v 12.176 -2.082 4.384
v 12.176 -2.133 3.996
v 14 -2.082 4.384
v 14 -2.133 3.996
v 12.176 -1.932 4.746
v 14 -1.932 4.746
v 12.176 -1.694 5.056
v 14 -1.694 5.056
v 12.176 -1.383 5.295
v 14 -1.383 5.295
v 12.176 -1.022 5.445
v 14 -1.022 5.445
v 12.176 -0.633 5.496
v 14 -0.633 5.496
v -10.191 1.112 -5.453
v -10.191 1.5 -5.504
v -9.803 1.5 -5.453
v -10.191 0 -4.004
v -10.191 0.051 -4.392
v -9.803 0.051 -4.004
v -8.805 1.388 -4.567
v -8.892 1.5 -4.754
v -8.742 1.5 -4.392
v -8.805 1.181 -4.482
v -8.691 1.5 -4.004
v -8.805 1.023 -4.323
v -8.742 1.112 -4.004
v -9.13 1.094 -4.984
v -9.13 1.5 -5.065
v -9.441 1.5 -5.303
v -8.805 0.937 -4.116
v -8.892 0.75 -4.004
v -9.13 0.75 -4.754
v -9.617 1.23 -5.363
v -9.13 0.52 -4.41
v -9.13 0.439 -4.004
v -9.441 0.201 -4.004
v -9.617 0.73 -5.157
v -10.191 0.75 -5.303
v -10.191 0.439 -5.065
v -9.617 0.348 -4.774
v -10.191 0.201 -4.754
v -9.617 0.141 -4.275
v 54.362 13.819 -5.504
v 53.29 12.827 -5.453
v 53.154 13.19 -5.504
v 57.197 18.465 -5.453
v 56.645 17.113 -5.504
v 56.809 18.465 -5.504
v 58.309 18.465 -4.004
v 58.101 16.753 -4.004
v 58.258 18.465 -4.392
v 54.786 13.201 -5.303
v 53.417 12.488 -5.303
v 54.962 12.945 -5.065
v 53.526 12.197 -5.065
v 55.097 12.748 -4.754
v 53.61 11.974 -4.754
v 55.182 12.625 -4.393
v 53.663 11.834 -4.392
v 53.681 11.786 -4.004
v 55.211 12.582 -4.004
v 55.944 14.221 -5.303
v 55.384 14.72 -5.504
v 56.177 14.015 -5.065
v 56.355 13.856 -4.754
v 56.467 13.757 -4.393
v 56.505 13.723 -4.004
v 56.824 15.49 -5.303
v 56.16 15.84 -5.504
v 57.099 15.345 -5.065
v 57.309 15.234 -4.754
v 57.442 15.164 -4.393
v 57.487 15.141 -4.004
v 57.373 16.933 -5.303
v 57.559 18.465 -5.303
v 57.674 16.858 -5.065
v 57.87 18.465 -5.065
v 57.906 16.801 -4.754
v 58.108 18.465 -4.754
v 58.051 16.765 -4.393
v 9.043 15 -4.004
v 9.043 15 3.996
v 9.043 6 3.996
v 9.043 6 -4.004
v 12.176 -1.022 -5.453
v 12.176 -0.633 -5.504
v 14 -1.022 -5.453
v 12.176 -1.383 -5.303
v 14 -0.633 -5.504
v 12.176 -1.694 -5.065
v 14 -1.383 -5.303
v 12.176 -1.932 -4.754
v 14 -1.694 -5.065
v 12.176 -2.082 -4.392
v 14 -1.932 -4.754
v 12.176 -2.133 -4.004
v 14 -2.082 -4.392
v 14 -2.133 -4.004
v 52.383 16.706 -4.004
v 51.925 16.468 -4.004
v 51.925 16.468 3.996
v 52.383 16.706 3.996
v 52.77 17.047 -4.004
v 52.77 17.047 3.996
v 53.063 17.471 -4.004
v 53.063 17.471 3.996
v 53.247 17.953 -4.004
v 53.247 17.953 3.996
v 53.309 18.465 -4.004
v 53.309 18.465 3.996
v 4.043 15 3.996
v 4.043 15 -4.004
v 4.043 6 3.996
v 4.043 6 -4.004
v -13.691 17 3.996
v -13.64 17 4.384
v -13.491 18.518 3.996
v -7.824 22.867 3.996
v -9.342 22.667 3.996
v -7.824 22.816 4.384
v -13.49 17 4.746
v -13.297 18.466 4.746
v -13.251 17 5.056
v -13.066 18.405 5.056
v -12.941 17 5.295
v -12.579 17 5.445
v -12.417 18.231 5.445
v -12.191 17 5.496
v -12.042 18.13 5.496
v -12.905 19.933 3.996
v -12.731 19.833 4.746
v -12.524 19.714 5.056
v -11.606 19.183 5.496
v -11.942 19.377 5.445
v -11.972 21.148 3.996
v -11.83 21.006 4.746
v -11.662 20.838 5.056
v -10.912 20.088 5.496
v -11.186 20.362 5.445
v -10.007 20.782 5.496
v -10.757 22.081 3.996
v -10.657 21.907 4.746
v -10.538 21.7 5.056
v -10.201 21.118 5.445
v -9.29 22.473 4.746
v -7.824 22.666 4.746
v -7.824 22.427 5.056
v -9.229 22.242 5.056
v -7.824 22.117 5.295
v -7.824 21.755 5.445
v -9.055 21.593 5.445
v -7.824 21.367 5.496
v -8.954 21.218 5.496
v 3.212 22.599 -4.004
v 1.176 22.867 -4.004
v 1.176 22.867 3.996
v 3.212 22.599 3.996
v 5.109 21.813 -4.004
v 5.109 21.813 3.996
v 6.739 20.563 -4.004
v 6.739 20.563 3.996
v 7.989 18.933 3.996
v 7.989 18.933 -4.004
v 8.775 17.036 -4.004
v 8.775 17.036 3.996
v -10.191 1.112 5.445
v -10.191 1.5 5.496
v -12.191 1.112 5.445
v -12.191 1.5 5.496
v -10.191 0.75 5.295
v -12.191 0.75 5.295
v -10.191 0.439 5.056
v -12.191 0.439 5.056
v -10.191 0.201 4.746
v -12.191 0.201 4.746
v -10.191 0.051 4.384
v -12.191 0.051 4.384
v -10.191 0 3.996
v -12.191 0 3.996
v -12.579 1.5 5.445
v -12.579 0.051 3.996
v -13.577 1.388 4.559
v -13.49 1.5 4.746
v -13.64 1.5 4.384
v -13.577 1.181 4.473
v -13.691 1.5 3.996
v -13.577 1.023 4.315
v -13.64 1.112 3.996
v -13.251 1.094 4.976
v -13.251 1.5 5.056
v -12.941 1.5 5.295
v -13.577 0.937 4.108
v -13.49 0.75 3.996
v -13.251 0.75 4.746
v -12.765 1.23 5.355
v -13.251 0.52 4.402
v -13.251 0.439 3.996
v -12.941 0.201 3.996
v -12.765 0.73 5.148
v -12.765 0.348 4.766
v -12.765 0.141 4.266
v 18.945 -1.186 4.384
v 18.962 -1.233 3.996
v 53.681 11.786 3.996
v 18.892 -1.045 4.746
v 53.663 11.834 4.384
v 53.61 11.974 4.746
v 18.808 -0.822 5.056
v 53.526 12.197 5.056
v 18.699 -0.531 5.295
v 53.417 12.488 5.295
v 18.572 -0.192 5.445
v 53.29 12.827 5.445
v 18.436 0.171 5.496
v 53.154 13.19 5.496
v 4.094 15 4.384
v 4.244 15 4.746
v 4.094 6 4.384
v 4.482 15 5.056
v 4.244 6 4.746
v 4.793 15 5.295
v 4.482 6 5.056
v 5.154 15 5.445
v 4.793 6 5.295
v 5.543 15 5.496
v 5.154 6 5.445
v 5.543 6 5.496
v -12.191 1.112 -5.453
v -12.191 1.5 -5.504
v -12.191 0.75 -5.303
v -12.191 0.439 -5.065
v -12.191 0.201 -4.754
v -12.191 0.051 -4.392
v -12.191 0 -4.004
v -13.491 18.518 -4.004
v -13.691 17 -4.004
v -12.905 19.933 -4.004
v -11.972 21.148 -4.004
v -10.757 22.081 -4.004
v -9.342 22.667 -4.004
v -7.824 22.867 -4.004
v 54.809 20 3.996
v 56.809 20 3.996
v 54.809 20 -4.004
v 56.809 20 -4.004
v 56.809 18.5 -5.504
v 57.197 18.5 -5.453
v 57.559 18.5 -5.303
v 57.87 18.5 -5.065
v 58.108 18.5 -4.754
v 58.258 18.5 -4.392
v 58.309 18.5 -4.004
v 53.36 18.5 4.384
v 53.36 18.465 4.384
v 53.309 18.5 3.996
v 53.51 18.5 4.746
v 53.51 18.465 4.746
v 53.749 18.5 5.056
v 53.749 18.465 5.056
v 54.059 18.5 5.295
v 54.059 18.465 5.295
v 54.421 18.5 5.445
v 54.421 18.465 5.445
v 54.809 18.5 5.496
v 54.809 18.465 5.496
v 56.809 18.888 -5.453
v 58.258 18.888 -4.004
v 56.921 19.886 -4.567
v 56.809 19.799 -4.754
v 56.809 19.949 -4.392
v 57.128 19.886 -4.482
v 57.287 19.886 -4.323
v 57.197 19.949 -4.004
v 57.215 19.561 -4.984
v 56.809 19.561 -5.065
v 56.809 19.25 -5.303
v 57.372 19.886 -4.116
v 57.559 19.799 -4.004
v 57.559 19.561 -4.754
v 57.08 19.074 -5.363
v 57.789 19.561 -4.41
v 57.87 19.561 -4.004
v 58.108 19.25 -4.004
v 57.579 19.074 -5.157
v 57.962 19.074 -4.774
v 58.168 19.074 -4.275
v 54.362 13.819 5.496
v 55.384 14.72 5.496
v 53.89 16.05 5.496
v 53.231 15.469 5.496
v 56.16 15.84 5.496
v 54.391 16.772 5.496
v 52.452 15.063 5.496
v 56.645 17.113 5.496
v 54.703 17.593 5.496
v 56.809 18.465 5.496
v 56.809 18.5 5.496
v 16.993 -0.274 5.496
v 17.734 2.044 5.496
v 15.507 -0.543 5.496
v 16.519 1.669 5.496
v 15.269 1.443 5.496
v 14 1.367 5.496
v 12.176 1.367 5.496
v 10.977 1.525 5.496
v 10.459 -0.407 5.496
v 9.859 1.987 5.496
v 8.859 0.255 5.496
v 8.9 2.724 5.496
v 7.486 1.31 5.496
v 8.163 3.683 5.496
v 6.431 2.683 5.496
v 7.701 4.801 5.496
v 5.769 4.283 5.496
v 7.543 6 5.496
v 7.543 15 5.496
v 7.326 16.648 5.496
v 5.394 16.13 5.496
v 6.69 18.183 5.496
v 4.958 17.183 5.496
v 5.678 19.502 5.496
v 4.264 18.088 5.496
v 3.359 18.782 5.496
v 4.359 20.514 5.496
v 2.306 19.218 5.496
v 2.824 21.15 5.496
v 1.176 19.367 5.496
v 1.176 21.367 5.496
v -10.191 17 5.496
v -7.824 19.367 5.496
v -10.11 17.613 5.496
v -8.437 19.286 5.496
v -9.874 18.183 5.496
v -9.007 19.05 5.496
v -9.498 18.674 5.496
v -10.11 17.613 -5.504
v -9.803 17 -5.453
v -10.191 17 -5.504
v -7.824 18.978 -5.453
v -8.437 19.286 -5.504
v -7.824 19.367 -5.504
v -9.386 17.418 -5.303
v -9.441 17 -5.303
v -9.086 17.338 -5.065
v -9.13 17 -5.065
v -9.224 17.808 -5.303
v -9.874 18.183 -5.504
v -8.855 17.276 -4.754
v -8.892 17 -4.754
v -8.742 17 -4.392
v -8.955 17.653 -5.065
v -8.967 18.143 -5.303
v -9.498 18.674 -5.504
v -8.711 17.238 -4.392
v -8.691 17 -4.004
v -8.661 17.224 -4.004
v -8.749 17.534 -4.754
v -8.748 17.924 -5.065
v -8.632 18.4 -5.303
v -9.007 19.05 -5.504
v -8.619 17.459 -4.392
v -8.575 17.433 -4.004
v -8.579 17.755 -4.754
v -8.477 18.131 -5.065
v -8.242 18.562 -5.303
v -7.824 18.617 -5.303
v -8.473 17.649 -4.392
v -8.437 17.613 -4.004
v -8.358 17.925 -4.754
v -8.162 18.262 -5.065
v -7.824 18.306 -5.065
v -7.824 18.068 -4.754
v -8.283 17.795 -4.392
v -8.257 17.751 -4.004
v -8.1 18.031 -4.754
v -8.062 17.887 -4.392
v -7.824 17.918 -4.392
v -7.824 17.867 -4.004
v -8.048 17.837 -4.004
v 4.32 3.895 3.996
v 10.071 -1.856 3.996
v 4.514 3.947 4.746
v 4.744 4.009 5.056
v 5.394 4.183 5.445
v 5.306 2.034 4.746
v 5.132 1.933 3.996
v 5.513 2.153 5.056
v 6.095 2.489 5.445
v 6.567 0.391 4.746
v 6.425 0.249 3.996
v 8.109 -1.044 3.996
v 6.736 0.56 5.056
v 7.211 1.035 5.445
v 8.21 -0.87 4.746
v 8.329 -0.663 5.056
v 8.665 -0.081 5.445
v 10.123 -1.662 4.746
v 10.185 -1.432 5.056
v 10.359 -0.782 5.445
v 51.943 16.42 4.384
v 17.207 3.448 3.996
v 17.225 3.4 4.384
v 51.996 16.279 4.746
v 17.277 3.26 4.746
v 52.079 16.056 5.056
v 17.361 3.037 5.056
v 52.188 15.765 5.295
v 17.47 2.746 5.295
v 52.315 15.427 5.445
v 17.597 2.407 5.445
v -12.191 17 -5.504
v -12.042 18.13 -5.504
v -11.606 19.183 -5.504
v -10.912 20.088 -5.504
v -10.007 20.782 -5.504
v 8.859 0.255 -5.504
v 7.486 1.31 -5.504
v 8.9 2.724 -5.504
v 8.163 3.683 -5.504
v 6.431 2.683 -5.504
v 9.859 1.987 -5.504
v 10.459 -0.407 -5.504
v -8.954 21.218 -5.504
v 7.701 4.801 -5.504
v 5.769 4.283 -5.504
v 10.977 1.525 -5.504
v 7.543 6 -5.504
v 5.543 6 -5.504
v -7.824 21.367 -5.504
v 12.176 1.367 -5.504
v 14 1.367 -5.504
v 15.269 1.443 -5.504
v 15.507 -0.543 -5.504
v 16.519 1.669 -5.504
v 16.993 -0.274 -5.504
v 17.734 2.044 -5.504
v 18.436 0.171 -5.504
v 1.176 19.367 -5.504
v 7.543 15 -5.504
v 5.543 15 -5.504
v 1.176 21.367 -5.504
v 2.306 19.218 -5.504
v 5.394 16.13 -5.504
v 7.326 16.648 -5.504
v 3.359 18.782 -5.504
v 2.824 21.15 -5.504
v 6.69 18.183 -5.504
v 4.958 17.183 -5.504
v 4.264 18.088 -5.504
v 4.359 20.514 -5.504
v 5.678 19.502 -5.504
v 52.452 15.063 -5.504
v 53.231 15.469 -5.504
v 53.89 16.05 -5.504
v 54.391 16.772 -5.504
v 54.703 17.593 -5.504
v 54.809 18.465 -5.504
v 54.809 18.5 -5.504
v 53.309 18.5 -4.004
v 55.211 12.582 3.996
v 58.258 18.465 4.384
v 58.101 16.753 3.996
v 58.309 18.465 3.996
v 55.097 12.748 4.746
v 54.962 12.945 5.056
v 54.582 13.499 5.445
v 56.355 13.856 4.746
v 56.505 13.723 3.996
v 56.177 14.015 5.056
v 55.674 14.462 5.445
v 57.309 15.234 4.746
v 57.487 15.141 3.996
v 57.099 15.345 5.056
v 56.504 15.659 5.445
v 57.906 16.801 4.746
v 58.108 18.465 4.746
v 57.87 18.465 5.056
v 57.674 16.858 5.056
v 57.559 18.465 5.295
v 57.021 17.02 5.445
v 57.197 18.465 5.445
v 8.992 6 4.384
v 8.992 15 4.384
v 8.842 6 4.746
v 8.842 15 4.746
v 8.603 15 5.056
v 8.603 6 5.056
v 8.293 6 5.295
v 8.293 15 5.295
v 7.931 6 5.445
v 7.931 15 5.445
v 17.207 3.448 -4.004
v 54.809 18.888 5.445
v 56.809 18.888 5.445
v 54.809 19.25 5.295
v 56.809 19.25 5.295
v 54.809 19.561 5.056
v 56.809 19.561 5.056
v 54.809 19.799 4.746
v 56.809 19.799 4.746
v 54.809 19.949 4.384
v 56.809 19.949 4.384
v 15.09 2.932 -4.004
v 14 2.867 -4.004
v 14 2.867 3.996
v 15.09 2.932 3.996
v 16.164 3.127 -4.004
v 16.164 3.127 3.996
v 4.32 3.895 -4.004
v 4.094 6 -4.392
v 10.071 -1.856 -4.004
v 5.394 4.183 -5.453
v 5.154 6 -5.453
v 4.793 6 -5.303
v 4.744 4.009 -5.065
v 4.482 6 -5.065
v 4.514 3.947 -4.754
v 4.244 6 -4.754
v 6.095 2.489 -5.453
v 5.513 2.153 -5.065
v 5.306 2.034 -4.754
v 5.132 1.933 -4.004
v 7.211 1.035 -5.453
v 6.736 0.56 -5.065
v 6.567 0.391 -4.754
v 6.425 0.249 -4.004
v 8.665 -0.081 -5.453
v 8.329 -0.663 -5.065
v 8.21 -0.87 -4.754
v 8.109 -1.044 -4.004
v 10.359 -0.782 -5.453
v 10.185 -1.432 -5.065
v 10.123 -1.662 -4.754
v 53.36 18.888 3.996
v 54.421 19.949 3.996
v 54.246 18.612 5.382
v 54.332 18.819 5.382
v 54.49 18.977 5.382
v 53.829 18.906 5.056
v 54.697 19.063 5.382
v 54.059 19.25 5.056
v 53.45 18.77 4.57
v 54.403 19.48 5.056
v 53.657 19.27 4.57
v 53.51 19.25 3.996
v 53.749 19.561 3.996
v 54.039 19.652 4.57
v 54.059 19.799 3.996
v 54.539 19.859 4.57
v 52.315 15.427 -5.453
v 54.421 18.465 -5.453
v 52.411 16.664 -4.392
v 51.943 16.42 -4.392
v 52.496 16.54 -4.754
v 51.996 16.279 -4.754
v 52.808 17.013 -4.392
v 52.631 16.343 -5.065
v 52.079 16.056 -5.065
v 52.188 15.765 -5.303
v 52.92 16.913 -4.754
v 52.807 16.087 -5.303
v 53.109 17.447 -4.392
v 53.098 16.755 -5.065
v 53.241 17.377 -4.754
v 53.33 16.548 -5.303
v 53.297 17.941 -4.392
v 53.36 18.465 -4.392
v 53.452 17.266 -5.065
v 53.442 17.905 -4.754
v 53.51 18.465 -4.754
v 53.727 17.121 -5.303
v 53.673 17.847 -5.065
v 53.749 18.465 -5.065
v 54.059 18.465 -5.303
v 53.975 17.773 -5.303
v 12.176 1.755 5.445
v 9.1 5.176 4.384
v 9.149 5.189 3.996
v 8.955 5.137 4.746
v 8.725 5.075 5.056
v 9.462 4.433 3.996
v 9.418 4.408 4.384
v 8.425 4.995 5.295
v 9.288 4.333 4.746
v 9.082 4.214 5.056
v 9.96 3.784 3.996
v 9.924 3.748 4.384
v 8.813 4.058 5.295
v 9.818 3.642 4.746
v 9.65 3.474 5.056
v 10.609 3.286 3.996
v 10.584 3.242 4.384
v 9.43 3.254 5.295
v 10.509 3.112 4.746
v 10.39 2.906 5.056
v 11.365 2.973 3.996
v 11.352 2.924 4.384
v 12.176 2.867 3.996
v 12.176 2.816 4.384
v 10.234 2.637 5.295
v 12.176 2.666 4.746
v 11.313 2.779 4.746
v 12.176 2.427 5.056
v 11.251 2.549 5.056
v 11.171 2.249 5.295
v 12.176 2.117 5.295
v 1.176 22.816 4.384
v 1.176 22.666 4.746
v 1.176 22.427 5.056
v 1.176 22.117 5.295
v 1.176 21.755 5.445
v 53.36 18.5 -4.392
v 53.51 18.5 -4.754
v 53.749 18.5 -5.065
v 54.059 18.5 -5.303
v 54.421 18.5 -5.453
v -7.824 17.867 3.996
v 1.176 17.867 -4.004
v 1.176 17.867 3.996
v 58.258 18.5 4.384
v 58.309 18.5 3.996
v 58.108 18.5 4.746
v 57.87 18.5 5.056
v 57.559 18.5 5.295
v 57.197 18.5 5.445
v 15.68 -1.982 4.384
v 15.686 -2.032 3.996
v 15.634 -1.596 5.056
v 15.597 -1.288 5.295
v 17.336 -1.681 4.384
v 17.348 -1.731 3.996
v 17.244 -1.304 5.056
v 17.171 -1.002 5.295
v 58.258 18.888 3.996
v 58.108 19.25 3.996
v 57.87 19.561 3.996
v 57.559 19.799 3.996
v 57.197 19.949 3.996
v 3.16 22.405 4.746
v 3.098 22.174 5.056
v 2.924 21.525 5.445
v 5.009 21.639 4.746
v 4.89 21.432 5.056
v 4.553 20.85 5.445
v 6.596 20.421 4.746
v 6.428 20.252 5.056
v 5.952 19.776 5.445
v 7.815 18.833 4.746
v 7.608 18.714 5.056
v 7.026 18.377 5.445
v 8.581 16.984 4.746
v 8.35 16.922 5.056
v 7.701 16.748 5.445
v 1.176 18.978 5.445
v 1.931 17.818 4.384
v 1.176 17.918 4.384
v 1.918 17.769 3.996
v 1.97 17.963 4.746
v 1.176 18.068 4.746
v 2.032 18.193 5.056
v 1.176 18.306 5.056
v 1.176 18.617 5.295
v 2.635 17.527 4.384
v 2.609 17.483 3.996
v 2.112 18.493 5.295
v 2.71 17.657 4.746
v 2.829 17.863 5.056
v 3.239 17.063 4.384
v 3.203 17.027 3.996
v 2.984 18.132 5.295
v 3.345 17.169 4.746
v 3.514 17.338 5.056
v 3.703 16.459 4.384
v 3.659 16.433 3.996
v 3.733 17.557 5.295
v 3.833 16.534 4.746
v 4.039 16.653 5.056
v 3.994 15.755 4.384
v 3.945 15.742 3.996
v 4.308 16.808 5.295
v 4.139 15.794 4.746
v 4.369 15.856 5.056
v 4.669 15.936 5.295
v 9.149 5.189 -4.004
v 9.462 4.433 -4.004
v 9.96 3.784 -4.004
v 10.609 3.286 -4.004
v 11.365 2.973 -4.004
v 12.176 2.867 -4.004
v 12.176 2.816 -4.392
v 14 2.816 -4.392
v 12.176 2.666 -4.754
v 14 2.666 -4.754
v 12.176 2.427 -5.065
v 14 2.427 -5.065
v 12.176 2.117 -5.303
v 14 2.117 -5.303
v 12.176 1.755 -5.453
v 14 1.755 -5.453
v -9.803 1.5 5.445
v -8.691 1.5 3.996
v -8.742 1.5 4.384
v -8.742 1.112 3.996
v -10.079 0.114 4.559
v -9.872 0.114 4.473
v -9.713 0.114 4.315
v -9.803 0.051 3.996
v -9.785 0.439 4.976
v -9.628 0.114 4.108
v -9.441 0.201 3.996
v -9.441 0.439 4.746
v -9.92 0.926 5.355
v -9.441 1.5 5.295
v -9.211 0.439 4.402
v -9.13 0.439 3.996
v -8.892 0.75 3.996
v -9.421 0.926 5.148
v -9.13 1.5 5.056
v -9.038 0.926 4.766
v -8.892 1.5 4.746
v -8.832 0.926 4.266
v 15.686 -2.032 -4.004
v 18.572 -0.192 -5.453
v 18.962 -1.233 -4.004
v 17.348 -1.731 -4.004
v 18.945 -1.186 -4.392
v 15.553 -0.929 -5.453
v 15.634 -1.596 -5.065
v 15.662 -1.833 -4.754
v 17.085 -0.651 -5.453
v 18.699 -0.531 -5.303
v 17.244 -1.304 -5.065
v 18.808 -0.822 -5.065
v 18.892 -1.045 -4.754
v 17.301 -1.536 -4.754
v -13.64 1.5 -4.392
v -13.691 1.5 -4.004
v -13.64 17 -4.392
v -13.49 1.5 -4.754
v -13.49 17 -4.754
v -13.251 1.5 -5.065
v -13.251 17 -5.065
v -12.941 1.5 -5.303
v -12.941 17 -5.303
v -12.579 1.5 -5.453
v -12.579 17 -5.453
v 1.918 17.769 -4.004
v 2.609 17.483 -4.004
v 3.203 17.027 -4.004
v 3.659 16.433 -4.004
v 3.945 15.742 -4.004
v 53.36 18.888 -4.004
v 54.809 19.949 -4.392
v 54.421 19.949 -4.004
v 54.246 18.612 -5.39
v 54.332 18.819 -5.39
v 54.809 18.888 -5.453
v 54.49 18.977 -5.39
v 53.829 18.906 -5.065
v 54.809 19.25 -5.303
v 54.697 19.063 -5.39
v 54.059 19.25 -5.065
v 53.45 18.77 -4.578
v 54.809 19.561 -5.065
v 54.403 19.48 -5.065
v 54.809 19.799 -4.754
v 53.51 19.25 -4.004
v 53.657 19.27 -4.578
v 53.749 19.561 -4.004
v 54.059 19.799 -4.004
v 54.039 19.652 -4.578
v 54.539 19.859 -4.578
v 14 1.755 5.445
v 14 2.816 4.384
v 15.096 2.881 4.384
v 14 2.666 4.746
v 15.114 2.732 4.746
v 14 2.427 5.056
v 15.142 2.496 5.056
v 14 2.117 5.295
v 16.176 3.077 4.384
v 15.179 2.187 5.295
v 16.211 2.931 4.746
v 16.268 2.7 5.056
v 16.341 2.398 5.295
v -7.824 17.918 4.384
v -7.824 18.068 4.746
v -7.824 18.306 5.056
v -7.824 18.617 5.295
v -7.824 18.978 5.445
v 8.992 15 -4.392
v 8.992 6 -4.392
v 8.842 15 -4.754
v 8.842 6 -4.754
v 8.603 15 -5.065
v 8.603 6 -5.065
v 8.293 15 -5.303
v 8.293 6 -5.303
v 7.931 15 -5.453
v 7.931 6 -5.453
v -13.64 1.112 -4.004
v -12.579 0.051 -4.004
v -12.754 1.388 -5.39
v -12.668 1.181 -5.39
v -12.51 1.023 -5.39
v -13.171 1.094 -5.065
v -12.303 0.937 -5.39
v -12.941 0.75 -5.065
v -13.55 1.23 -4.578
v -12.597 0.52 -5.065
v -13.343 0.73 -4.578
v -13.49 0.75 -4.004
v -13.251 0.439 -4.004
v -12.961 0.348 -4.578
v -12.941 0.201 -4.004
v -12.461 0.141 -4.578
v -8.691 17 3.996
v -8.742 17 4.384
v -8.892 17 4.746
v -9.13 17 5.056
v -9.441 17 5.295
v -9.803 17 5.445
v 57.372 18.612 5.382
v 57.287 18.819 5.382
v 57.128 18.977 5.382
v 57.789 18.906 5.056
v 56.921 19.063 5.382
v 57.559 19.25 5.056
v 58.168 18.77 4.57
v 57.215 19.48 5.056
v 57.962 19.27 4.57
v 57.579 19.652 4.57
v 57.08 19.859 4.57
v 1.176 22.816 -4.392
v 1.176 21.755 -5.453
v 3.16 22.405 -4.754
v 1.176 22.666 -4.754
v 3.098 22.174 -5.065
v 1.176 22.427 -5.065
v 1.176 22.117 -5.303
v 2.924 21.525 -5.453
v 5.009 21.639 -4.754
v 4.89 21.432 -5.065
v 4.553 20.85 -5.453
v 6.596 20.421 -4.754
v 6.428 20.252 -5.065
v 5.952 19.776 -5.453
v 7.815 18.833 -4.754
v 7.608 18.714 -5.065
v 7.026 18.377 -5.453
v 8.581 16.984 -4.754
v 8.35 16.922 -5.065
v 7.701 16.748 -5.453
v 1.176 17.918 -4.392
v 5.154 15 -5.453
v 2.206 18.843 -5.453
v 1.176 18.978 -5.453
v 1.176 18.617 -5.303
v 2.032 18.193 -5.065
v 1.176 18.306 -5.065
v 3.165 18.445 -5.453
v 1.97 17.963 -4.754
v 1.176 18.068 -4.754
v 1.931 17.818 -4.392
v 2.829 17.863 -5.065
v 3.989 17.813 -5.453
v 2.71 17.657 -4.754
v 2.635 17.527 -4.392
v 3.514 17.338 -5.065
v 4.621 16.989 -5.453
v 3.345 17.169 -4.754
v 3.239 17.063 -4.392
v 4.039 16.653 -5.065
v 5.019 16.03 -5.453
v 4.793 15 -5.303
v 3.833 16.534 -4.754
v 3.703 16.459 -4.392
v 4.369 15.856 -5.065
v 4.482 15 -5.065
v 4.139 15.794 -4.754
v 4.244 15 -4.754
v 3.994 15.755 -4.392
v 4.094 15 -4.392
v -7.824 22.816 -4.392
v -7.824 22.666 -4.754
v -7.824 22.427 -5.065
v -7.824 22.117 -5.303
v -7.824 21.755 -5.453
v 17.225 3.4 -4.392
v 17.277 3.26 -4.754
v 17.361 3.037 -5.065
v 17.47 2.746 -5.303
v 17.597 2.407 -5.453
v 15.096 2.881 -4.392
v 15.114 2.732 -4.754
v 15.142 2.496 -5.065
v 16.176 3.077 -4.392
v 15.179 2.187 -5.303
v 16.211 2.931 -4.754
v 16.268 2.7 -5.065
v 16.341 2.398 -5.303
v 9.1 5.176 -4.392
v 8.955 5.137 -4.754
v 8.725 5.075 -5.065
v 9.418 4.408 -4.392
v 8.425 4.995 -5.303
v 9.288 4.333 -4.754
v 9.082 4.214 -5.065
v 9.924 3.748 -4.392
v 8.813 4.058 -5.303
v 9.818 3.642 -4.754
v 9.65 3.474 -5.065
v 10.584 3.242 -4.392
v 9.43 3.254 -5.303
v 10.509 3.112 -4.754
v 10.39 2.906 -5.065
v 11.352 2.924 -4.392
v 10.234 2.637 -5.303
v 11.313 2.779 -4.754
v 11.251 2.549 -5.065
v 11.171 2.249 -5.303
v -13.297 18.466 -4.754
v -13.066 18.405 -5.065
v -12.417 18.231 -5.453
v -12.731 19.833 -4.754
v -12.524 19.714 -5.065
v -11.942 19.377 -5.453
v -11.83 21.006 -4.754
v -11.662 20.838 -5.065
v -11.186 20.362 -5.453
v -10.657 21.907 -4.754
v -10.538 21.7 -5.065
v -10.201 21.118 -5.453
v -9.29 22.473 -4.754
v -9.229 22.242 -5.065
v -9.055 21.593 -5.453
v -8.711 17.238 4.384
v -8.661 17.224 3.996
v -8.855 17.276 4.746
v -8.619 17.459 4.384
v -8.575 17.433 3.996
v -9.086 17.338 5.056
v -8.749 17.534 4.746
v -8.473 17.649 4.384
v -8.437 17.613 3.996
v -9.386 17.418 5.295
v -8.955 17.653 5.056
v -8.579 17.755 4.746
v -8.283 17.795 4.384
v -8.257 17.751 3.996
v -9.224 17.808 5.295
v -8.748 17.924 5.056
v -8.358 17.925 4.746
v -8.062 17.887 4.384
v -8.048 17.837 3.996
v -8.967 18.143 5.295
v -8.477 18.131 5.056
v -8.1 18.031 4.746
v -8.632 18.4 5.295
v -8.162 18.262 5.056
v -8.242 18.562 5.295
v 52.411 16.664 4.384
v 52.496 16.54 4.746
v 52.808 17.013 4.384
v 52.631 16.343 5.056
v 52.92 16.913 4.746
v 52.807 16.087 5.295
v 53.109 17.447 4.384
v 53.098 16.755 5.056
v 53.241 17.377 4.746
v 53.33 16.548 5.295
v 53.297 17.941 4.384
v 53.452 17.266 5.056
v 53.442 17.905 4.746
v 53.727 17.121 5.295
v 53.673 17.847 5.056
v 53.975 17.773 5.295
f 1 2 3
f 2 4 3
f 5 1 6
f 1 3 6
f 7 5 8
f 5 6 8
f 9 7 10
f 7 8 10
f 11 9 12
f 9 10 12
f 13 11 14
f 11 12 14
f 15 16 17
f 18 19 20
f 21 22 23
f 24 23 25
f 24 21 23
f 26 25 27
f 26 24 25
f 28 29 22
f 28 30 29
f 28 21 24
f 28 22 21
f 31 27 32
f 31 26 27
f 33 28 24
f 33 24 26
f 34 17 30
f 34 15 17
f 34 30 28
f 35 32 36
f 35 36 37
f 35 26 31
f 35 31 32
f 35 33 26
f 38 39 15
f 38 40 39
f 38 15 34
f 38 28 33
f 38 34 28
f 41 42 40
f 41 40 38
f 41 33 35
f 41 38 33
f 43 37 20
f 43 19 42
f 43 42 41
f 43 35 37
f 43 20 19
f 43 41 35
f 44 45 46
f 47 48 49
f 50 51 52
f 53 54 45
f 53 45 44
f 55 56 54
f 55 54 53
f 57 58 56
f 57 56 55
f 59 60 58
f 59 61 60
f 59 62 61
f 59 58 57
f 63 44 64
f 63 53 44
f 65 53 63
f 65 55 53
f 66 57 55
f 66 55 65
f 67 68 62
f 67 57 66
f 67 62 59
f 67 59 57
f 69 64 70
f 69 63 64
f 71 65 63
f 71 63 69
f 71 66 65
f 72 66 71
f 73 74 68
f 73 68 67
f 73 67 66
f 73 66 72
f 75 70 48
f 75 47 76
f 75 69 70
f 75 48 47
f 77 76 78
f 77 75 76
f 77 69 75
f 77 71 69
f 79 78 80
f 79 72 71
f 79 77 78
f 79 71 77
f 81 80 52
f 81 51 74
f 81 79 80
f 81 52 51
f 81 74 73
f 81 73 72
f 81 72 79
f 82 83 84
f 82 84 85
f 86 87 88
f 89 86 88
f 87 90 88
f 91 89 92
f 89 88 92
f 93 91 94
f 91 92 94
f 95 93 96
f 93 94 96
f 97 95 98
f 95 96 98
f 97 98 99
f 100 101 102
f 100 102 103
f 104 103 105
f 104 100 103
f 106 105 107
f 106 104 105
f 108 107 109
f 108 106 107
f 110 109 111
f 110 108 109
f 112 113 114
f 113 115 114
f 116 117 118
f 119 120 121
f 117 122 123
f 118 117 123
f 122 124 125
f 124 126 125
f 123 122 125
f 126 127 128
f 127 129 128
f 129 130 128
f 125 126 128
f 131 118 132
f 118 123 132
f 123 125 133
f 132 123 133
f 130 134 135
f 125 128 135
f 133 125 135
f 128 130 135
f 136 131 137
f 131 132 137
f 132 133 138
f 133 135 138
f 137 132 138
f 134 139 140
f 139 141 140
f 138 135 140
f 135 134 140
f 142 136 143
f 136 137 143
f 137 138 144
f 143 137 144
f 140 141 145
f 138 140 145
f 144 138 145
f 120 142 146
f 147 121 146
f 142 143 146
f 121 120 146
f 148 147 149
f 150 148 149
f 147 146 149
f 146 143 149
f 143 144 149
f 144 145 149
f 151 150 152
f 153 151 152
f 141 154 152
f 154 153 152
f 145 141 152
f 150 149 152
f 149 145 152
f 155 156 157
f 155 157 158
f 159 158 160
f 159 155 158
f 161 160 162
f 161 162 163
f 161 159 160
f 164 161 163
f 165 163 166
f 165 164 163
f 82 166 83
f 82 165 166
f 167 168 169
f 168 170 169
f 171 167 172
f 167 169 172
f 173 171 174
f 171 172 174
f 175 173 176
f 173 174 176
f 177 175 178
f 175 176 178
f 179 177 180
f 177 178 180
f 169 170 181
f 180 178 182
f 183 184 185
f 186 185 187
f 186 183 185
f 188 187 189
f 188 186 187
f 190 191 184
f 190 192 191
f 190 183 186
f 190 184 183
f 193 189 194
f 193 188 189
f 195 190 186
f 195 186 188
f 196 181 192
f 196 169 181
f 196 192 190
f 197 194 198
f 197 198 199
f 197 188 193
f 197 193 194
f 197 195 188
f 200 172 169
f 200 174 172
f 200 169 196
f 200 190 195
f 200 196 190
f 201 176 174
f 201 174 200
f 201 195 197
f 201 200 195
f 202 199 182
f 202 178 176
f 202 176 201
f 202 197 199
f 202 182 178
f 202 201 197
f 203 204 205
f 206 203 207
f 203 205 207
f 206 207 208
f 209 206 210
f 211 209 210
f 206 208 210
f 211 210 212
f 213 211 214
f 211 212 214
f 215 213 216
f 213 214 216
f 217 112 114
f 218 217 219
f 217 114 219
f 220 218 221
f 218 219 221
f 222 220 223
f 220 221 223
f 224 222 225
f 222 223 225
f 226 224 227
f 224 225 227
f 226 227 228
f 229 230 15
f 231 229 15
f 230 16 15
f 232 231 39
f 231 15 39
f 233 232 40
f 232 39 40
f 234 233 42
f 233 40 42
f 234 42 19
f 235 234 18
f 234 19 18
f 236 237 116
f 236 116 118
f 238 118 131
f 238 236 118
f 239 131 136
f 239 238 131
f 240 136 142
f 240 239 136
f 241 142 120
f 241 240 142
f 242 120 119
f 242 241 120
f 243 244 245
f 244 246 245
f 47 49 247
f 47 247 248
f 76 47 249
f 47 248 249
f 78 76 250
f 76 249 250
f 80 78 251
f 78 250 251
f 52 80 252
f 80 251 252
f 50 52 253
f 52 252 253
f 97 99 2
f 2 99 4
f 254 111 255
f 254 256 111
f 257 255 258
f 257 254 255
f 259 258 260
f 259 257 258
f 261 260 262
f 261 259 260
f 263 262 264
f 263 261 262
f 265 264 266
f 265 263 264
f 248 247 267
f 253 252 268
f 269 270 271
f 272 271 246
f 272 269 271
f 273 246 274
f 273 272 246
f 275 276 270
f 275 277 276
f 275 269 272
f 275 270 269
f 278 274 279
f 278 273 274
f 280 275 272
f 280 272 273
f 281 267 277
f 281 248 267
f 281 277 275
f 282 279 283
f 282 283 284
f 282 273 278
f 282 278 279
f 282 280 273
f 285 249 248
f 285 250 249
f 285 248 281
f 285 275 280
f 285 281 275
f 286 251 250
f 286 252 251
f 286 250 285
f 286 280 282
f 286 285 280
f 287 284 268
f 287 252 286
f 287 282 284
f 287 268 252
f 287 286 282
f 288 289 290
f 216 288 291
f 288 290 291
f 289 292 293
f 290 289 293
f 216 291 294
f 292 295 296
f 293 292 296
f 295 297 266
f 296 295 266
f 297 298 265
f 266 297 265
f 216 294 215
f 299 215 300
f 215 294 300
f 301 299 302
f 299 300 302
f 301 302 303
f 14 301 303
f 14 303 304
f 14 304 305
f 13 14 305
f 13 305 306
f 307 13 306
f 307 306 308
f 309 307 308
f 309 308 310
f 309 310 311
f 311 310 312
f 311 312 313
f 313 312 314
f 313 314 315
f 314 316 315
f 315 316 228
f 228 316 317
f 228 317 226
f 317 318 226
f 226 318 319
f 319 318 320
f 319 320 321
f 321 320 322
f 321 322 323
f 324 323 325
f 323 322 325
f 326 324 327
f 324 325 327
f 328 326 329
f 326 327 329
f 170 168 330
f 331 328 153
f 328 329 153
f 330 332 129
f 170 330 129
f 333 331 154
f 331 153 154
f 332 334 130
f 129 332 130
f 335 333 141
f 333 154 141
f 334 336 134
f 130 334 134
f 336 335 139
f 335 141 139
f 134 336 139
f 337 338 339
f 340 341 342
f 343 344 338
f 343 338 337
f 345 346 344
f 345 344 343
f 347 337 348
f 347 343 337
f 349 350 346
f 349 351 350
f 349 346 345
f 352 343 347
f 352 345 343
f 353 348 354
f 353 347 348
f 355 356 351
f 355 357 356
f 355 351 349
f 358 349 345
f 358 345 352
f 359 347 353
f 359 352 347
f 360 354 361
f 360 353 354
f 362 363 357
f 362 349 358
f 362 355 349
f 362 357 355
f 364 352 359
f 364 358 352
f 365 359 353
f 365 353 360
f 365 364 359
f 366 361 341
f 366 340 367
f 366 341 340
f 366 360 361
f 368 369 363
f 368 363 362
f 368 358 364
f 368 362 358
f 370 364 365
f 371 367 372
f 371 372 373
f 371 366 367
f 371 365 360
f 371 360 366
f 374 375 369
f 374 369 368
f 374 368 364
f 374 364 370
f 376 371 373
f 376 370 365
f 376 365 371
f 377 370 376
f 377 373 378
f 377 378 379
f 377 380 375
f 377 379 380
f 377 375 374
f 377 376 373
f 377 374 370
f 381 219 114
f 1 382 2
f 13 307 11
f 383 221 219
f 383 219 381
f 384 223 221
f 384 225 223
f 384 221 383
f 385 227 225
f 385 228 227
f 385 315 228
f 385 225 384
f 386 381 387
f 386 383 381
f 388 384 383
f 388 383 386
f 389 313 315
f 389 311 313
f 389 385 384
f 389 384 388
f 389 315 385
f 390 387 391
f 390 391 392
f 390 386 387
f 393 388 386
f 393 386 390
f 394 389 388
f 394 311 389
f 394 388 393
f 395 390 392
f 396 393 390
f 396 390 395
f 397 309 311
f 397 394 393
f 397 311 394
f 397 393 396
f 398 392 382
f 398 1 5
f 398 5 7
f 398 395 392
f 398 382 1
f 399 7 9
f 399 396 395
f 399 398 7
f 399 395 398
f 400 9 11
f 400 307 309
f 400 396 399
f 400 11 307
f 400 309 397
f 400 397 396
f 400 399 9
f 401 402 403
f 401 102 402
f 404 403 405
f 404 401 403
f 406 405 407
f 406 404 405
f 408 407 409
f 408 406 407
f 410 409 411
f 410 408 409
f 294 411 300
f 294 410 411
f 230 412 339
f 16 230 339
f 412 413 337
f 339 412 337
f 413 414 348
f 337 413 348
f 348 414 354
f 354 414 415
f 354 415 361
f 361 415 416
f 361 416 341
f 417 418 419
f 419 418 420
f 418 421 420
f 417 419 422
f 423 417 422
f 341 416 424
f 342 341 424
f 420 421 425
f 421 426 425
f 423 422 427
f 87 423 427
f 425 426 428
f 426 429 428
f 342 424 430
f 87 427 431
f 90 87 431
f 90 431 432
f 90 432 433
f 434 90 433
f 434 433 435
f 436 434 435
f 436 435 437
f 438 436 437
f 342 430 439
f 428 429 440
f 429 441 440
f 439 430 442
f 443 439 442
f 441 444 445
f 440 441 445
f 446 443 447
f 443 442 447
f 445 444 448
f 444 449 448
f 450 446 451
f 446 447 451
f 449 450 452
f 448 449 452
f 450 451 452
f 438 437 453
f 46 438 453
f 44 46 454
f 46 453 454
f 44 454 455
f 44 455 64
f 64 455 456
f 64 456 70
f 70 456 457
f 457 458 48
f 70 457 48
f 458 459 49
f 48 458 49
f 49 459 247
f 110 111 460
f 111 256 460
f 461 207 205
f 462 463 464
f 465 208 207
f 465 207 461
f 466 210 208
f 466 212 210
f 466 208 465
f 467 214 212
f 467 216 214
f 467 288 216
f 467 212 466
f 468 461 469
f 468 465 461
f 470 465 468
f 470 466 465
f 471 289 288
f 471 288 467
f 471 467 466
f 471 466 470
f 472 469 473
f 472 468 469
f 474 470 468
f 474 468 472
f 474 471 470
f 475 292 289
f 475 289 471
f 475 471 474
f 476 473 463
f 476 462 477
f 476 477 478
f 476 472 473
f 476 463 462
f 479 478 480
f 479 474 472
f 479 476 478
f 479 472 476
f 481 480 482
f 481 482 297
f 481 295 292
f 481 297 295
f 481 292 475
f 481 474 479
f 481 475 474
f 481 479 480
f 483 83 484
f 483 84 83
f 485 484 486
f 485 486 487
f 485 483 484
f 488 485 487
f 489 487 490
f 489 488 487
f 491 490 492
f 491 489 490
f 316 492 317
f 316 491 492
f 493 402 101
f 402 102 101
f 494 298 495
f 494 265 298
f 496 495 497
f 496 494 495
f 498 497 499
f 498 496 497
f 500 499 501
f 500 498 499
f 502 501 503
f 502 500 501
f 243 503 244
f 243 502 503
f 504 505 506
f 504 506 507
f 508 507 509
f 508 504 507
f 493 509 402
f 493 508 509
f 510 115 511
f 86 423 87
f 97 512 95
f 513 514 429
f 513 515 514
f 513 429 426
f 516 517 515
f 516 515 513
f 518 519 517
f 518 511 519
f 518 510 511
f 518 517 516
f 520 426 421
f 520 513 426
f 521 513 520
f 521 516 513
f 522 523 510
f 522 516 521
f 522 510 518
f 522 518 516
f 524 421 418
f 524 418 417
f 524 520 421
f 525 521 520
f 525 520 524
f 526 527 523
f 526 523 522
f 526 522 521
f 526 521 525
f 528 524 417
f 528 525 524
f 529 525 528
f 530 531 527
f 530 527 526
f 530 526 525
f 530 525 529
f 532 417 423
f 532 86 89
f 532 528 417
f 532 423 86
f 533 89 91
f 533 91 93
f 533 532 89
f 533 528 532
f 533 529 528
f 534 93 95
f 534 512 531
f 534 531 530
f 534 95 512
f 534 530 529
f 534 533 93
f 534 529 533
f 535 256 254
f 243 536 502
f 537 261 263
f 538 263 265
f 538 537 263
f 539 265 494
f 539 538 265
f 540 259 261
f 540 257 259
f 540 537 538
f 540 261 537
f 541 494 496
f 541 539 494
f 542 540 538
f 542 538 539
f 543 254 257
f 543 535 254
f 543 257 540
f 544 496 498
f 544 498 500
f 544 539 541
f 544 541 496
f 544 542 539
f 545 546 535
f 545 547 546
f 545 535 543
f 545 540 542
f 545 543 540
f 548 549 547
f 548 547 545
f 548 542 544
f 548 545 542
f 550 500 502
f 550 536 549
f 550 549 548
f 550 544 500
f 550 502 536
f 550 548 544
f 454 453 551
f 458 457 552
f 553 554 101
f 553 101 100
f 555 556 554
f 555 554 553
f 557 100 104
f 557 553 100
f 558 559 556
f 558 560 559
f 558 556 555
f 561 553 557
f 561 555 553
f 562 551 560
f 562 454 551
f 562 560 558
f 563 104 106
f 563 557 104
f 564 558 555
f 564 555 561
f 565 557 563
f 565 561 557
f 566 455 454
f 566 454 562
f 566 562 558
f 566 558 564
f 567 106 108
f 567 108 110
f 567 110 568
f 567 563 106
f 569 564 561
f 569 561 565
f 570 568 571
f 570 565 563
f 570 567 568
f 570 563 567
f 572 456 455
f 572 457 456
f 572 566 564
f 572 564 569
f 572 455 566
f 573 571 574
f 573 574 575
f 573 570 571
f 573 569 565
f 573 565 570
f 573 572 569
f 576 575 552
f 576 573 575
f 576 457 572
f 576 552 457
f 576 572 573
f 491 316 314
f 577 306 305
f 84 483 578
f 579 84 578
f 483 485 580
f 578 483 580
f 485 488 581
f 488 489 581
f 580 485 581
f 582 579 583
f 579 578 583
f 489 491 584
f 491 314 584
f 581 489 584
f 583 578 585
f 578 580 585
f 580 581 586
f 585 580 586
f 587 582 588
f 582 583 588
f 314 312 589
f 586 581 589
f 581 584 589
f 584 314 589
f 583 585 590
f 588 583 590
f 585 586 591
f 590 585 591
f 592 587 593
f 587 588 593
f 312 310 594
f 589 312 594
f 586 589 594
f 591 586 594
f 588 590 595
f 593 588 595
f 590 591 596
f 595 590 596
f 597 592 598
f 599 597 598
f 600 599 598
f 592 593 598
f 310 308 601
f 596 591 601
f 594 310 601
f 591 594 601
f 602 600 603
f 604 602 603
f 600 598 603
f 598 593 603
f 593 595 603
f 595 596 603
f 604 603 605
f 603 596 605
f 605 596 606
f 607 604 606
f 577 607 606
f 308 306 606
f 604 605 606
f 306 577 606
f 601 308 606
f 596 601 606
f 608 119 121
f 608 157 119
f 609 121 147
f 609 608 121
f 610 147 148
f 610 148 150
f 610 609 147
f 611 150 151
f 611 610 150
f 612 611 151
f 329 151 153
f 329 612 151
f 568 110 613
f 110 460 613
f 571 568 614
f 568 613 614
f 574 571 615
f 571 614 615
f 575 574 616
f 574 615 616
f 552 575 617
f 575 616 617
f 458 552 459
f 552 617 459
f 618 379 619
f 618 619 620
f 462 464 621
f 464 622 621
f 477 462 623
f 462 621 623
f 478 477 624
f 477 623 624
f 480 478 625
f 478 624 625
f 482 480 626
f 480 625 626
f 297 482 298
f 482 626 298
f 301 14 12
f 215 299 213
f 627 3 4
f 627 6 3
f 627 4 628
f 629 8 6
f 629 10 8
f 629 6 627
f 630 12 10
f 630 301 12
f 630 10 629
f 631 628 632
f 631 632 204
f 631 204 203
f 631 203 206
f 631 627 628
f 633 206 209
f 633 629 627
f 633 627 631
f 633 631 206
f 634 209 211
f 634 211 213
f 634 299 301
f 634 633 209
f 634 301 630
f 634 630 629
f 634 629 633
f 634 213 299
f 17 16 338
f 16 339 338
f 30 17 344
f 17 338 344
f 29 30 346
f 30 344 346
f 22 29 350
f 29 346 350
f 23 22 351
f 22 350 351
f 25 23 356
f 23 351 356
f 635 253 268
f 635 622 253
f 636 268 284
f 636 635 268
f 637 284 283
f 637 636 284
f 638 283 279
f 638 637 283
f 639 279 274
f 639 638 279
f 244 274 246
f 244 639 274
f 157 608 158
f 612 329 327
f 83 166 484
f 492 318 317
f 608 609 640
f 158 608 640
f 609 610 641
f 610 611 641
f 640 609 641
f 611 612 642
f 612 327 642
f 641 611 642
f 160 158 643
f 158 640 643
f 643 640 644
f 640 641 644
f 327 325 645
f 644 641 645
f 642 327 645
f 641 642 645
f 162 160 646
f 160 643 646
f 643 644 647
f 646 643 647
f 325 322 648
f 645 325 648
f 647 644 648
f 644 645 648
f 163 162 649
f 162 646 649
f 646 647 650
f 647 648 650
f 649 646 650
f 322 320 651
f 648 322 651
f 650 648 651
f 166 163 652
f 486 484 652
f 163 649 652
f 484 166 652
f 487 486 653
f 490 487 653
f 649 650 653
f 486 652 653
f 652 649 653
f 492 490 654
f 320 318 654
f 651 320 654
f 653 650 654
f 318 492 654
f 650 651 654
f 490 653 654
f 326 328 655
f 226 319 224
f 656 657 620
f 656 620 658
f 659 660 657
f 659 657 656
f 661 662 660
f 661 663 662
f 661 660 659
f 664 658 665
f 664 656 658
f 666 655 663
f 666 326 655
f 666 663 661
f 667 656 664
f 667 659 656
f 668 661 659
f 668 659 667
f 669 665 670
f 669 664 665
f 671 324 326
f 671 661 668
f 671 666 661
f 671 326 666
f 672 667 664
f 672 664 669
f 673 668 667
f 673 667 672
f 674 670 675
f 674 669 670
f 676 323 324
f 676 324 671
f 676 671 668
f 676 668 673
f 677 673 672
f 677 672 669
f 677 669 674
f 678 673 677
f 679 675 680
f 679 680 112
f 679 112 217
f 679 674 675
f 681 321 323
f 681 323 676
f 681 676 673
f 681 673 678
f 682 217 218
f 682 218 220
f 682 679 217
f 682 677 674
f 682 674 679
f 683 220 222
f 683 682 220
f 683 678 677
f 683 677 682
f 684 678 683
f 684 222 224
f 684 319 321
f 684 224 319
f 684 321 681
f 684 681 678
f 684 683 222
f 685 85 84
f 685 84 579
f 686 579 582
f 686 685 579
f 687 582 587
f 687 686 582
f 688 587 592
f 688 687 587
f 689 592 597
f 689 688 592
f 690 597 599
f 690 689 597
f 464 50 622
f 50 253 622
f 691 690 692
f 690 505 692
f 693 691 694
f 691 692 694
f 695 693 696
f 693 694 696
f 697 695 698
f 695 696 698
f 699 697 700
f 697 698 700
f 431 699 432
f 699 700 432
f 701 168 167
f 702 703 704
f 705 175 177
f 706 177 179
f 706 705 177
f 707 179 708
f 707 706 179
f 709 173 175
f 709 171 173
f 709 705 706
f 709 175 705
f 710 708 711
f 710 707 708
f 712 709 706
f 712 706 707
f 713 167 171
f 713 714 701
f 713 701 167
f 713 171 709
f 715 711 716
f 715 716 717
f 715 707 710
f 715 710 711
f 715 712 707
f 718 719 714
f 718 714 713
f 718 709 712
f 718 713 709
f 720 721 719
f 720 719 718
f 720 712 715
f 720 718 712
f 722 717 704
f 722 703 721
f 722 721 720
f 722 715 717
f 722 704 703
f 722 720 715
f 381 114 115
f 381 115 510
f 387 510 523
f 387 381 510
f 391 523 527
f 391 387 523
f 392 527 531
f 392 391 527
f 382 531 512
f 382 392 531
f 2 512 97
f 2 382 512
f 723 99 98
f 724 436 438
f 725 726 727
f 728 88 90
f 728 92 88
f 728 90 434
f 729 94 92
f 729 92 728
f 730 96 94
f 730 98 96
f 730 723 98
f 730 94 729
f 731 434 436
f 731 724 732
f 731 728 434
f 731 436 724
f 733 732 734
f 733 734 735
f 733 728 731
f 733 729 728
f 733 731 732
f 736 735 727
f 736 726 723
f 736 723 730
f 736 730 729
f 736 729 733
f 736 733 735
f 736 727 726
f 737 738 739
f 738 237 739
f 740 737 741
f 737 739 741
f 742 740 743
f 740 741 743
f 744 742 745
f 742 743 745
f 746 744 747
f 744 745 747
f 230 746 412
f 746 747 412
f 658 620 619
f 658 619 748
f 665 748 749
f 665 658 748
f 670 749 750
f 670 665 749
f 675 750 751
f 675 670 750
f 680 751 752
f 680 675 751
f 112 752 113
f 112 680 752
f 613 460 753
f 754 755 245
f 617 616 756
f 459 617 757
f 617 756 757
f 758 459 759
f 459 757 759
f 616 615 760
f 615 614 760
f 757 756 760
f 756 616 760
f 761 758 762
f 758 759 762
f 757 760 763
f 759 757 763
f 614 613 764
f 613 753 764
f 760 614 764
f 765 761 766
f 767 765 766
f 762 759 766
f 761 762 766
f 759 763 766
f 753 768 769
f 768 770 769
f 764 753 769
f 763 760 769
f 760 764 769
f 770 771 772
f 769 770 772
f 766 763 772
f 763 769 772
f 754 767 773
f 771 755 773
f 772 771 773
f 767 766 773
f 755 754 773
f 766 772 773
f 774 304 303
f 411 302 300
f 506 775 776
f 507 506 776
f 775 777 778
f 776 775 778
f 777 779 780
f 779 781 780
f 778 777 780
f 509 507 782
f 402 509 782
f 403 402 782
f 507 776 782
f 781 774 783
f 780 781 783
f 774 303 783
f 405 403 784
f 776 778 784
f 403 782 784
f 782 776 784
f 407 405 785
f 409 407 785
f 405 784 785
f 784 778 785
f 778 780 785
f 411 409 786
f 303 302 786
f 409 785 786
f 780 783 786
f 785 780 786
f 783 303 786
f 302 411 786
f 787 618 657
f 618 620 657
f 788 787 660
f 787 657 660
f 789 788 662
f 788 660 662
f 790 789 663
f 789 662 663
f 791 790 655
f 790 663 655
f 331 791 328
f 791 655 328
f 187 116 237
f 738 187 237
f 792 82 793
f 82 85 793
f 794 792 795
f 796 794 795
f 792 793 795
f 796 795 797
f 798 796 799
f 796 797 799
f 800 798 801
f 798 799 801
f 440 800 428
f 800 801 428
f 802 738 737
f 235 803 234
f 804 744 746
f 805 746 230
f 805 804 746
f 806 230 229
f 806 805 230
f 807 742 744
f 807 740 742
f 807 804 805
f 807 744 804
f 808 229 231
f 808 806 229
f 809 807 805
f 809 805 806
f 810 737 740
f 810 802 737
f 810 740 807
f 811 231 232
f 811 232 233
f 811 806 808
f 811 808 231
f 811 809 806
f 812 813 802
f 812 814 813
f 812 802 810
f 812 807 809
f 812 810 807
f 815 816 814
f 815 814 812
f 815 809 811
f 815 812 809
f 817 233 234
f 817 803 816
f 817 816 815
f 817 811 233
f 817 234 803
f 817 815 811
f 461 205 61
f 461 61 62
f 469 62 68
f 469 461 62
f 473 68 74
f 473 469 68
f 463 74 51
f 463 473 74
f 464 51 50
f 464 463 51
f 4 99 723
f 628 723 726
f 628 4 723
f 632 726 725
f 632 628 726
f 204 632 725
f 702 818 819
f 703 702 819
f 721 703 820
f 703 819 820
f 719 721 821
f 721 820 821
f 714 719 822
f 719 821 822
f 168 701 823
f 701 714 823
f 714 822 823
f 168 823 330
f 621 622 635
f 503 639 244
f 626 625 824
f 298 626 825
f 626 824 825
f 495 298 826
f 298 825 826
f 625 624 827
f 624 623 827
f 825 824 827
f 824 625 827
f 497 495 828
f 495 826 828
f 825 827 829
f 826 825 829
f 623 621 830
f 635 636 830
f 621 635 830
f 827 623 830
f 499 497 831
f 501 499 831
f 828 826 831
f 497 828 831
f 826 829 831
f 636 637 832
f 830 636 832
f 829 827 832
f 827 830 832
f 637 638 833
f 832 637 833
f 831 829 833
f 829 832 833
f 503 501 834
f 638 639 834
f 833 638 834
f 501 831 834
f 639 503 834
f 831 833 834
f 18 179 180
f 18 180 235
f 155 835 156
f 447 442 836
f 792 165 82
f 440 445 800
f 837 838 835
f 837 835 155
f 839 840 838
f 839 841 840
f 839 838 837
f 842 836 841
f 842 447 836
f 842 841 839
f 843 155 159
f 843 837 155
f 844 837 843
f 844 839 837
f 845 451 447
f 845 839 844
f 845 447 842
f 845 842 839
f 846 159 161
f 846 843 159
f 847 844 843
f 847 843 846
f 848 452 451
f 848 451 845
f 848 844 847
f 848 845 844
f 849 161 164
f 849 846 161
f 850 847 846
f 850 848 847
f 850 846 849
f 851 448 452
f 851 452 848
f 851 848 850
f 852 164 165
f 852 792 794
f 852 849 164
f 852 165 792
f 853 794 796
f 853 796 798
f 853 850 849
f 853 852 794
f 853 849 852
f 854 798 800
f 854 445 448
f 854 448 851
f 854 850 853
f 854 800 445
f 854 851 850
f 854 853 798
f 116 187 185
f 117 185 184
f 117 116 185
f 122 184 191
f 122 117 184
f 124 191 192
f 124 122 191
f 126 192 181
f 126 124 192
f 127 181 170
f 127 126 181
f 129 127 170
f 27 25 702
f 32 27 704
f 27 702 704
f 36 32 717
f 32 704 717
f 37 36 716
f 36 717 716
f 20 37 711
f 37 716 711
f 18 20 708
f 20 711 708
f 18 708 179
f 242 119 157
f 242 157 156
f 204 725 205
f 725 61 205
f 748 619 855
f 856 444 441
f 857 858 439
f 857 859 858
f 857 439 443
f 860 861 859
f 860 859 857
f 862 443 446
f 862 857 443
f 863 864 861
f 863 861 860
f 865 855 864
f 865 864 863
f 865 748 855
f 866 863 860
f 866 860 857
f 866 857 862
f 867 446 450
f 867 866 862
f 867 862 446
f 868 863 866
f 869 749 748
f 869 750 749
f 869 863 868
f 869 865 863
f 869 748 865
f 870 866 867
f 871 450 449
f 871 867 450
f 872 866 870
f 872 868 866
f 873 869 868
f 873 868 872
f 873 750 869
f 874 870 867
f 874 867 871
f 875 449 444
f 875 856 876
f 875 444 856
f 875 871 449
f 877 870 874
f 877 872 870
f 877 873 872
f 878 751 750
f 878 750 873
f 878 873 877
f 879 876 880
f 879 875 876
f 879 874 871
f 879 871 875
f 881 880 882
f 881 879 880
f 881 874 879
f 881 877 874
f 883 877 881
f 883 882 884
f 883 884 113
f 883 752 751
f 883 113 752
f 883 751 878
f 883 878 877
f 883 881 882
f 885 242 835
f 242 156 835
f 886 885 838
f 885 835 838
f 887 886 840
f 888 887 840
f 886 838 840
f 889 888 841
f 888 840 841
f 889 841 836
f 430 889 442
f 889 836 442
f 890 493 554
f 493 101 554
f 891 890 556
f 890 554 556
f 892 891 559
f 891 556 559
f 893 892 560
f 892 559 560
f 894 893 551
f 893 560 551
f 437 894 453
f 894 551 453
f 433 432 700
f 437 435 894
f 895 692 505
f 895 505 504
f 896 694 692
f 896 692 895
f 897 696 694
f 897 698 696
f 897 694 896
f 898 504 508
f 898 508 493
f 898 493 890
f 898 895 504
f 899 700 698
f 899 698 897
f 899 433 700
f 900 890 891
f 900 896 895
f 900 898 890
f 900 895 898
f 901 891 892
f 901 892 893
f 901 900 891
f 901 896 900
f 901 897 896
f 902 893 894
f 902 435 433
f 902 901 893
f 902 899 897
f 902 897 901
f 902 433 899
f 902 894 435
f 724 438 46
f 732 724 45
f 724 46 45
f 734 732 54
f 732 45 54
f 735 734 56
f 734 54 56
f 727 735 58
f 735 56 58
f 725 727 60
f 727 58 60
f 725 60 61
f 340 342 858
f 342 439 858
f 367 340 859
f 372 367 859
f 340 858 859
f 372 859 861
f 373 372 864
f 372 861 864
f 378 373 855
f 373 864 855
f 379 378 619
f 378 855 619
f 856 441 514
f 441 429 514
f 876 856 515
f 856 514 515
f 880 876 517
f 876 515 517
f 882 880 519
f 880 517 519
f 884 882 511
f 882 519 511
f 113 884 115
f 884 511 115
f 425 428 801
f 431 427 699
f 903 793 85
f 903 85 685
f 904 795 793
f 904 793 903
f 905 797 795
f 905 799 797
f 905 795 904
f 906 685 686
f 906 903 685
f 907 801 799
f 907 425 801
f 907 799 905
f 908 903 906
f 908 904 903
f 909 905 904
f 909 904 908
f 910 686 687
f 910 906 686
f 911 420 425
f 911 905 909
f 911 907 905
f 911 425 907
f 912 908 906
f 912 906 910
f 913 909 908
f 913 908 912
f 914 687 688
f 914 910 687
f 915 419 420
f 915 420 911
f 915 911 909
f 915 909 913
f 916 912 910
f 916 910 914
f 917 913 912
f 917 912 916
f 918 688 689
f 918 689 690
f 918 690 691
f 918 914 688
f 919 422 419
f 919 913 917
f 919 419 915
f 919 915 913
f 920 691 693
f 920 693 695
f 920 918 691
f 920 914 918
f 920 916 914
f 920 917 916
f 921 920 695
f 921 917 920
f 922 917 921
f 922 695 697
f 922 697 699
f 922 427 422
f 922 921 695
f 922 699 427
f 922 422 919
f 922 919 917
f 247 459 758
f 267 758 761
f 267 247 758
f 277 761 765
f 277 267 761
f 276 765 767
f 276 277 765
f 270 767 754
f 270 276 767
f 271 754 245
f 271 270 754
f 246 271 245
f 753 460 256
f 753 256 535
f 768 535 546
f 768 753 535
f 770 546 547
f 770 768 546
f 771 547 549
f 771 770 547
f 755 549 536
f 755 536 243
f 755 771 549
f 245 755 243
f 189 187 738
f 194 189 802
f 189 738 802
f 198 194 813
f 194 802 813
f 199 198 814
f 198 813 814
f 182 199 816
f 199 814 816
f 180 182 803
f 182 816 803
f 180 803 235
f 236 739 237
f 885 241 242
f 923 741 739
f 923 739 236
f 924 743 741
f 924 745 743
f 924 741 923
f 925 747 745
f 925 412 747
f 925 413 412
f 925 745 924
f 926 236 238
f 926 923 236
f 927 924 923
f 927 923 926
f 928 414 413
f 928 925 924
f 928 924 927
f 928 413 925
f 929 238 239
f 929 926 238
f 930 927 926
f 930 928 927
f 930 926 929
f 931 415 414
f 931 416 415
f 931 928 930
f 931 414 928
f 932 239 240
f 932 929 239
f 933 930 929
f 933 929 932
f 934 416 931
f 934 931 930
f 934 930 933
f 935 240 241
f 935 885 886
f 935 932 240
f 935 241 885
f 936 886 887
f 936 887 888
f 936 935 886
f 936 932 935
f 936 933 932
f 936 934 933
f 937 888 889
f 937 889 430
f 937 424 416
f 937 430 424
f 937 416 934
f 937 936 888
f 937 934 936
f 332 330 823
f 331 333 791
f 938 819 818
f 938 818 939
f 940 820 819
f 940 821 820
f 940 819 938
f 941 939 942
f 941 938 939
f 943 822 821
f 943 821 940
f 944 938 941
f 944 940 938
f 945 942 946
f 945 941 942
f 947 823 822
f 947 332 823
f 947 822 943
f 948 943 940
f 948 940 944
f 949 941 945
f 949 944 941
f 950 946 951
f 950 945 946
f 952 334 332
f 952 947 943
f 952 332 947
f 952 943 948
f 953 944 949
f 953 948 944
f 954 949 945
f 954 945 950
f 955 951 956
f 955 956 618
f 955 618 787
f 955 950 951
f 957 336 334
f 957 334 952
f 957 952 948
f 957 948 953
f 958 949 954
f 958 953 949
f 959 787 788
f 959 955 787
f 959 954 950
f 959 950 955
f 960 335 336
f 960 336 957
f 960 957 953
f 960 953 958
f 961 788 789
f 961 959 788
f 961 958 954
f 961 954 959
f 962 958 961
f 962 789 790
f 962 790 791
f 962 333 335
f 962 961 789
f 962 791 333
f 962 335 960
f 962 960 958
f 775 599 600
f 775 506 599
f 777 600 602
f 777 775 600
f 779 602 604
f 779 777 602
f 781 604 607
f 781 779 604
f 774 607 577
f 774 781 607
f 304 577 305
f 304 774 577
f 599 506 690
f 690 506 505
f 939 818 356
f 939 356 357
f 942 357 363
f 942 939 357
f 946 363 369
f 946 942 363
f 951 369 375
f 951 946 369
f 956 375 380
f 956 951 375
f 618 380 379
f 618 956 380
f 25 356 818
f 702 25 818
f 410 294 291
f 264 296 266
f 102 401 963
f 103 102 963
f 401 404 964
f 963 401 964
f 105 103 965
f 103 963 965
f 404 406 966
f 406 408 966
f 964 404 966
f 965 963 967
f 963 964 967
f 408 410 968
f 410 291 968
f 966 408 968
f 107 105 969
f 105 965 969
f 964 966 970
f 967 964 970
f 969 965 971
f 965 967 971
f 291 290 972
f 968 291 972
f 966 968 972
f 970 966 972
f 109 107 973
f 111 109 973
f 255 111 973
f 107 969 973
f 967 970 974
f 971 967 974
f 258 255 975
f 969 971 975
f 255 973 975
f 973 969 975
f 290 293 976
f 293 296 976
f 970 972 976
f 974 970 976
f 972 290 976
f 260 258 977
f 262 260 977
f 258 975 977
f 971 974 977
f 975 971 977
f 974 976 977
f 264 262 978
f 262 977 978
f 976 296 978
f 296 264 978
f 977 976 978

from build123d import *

# Parameters (mm, degrees)
F1_W = 5
F1_H = 11
F3_R = 1.5


with BuildPart() as f2:
    # F2: sweep along a path in F0
    with BuildLine(Plane.XY) as f2_path:
        Line((-10.824024, 0), (-10.824024, 17))
        ThreePointArc((-10.824024, 17), (-9.945345, 19.12132), (-7.824024, 20))
        Line((-7.824024, 20), (1.175976, 20))
        ThreePointArc((1.175976, 20), (4.71151, 18.535534), (6.175976, 15))
        Line((6.175976, 15), (6.175976, 6))
        ThreePointArc((6.175976, 6), (7.933335, 1.757359), (12.175976, 0))
        Line((12.175976, 0), (13.999961, 0))
        ThreePointArc((13.999961, 0), (16.141058, 0.192557), (18.213442, 0.76405))
        Line((18.213442, 0.76405), (52.931593, 13.783356))
        ThreePointArc((52.931593, 13.783356), (55.285604, 15.617028), (56.175976, 18.465002))
        Line((56.175976, 18.465002), (56.175976, 20))
    # F1 (on Front) → F2 (sweep)
    with BuildSketch(Plane.XZ):
        with Locations((-11.190739, -0.00427)):
            Rectangle(F1_W, F1_H)
    sweep(path=f2_path.line)

    # F3
    f3_edges = [f2.edges().sort_by_distance(p)[0] for p in [
        (-8.690739, 8.5, 5.49573),
        (-11.190739, 0, 5.49573),
        (-13.690739, 8.5, 5.49573),
        (-11.972418, 21.148394, 5.49573),
        (-3.324024, 22.866714, 5.49573),
        (6.738583, 20.562607, 5.49573),
        (9.04269, 10.5, 5.49573),
        (9.960408, 3.784433, 5.49573),
        (13.087968, 2.866714, 5.49573),
        (15.629565, 3.013271, 5.49573),
        (34.565947, 9.957892, 5.49573),
        (52.929378, 17.249894, 5.49573),
        (53.309261, 19.232501, 5.49573),
        (55.809261, 20, 5.49573),
        (58.309261, 19.232501, 5.49573),
        (57.039006, 14.40192, 5.49573),
        (36.321564, 5.276246, 5.49573),
        (16.521689, -1.906496, 5.49573),
        (13.087968, -2.133286, 5.49573),
        (6.424874, 0.248899, 5.49573),
        (4.04269, 10.5, 5.49573),
        (3.203049, 17.027073, 5.49573),
        (-3.324024, 17.866714, 5.49573),
        (-8.436884, 17.61286, 5.49573),
        (-13.690739, 0, -0.00427),
        (-13.690739, 8.5, -5.50427),
        (-13.690739, 17, -0.00427),
        (-11.190739, 0, -5.50427),
        (-8.690739, 8.5, -5.50427),
        (-8.436884, 17.61286, -5.50427),
        (-3.324024, 17.866714, -5.50427),
        (3.203049, 17.027073, -5.50427),
        (4.04269, 10.5, -5.50427),
        (6.424874, 0.248899, -5.50427),
        (13.087968, -2.133286, -5.50427),
        (16.521689, -1.906496, -5.50427),
        (36.321564, 5.276246, -5.50427),
        (57.039006, 14.40192, -5.50427),
        (58.309261, 19.232501, -5.50427),
        (55.809261, 20, -5.50427),
        (53.309261, 19.232501, -5.50427),
        (52.929378, 17.249894, -5.50427),
        (34.565947, 9.957892, -5.50427),
        (15.629565, 3.013271, -5.50427),
        (13.087968, 2.866714, -5.50427),
        (9.960408, 3.784433, -5.50427),
        (9.04269, 10.5, -5.50427),
        (6.738583, 20.562607, -5.50427),
        (-3.324024, 22.866714, -5.50427),
        (-11.972418, 21.148394, -5.50427),
        (-8.690739, 0, -0.00427),
        (-8.690739, 17, -0.00427),
        (-7.824024, 22.866714, -0.00427),
        (-7.824024, 17.866714, -0.00427),
        (1.175976, 22.866714, -0.00427),
        (1.175976, 17.866714, -0.00427),
        (9.04269, 15, -0.00427),
        (4.04269, 15, -0.00427),
        (9.04269, 6, -0.00427),
        (4.04269, 6, -0.00427),
        (12.175976, 2.866714, -0.00427),
        (12.175976, -2.133286, -0.00427),
        (13.999961, 2.866714, -0.00427),
        (13.999961, -2.133286, -0.00427),
        (17.206871, 3.448238, -0.00427),
        (18.962489, -1.233408, -0.00427),
        (51.925022, 16.467545, -0.00427),
        (53.680639, 11.785899, -0.00427),
        (53.309261, 18.465002, -0.00427),
        (58.309261, 18.465002, -0.00427),
        (53.309261, 20, -0.00427),
        (58.309261, 20, -0.00427),
    ]]
    fillet(f3_edges, radius=F3_R)


solid = f2.part
